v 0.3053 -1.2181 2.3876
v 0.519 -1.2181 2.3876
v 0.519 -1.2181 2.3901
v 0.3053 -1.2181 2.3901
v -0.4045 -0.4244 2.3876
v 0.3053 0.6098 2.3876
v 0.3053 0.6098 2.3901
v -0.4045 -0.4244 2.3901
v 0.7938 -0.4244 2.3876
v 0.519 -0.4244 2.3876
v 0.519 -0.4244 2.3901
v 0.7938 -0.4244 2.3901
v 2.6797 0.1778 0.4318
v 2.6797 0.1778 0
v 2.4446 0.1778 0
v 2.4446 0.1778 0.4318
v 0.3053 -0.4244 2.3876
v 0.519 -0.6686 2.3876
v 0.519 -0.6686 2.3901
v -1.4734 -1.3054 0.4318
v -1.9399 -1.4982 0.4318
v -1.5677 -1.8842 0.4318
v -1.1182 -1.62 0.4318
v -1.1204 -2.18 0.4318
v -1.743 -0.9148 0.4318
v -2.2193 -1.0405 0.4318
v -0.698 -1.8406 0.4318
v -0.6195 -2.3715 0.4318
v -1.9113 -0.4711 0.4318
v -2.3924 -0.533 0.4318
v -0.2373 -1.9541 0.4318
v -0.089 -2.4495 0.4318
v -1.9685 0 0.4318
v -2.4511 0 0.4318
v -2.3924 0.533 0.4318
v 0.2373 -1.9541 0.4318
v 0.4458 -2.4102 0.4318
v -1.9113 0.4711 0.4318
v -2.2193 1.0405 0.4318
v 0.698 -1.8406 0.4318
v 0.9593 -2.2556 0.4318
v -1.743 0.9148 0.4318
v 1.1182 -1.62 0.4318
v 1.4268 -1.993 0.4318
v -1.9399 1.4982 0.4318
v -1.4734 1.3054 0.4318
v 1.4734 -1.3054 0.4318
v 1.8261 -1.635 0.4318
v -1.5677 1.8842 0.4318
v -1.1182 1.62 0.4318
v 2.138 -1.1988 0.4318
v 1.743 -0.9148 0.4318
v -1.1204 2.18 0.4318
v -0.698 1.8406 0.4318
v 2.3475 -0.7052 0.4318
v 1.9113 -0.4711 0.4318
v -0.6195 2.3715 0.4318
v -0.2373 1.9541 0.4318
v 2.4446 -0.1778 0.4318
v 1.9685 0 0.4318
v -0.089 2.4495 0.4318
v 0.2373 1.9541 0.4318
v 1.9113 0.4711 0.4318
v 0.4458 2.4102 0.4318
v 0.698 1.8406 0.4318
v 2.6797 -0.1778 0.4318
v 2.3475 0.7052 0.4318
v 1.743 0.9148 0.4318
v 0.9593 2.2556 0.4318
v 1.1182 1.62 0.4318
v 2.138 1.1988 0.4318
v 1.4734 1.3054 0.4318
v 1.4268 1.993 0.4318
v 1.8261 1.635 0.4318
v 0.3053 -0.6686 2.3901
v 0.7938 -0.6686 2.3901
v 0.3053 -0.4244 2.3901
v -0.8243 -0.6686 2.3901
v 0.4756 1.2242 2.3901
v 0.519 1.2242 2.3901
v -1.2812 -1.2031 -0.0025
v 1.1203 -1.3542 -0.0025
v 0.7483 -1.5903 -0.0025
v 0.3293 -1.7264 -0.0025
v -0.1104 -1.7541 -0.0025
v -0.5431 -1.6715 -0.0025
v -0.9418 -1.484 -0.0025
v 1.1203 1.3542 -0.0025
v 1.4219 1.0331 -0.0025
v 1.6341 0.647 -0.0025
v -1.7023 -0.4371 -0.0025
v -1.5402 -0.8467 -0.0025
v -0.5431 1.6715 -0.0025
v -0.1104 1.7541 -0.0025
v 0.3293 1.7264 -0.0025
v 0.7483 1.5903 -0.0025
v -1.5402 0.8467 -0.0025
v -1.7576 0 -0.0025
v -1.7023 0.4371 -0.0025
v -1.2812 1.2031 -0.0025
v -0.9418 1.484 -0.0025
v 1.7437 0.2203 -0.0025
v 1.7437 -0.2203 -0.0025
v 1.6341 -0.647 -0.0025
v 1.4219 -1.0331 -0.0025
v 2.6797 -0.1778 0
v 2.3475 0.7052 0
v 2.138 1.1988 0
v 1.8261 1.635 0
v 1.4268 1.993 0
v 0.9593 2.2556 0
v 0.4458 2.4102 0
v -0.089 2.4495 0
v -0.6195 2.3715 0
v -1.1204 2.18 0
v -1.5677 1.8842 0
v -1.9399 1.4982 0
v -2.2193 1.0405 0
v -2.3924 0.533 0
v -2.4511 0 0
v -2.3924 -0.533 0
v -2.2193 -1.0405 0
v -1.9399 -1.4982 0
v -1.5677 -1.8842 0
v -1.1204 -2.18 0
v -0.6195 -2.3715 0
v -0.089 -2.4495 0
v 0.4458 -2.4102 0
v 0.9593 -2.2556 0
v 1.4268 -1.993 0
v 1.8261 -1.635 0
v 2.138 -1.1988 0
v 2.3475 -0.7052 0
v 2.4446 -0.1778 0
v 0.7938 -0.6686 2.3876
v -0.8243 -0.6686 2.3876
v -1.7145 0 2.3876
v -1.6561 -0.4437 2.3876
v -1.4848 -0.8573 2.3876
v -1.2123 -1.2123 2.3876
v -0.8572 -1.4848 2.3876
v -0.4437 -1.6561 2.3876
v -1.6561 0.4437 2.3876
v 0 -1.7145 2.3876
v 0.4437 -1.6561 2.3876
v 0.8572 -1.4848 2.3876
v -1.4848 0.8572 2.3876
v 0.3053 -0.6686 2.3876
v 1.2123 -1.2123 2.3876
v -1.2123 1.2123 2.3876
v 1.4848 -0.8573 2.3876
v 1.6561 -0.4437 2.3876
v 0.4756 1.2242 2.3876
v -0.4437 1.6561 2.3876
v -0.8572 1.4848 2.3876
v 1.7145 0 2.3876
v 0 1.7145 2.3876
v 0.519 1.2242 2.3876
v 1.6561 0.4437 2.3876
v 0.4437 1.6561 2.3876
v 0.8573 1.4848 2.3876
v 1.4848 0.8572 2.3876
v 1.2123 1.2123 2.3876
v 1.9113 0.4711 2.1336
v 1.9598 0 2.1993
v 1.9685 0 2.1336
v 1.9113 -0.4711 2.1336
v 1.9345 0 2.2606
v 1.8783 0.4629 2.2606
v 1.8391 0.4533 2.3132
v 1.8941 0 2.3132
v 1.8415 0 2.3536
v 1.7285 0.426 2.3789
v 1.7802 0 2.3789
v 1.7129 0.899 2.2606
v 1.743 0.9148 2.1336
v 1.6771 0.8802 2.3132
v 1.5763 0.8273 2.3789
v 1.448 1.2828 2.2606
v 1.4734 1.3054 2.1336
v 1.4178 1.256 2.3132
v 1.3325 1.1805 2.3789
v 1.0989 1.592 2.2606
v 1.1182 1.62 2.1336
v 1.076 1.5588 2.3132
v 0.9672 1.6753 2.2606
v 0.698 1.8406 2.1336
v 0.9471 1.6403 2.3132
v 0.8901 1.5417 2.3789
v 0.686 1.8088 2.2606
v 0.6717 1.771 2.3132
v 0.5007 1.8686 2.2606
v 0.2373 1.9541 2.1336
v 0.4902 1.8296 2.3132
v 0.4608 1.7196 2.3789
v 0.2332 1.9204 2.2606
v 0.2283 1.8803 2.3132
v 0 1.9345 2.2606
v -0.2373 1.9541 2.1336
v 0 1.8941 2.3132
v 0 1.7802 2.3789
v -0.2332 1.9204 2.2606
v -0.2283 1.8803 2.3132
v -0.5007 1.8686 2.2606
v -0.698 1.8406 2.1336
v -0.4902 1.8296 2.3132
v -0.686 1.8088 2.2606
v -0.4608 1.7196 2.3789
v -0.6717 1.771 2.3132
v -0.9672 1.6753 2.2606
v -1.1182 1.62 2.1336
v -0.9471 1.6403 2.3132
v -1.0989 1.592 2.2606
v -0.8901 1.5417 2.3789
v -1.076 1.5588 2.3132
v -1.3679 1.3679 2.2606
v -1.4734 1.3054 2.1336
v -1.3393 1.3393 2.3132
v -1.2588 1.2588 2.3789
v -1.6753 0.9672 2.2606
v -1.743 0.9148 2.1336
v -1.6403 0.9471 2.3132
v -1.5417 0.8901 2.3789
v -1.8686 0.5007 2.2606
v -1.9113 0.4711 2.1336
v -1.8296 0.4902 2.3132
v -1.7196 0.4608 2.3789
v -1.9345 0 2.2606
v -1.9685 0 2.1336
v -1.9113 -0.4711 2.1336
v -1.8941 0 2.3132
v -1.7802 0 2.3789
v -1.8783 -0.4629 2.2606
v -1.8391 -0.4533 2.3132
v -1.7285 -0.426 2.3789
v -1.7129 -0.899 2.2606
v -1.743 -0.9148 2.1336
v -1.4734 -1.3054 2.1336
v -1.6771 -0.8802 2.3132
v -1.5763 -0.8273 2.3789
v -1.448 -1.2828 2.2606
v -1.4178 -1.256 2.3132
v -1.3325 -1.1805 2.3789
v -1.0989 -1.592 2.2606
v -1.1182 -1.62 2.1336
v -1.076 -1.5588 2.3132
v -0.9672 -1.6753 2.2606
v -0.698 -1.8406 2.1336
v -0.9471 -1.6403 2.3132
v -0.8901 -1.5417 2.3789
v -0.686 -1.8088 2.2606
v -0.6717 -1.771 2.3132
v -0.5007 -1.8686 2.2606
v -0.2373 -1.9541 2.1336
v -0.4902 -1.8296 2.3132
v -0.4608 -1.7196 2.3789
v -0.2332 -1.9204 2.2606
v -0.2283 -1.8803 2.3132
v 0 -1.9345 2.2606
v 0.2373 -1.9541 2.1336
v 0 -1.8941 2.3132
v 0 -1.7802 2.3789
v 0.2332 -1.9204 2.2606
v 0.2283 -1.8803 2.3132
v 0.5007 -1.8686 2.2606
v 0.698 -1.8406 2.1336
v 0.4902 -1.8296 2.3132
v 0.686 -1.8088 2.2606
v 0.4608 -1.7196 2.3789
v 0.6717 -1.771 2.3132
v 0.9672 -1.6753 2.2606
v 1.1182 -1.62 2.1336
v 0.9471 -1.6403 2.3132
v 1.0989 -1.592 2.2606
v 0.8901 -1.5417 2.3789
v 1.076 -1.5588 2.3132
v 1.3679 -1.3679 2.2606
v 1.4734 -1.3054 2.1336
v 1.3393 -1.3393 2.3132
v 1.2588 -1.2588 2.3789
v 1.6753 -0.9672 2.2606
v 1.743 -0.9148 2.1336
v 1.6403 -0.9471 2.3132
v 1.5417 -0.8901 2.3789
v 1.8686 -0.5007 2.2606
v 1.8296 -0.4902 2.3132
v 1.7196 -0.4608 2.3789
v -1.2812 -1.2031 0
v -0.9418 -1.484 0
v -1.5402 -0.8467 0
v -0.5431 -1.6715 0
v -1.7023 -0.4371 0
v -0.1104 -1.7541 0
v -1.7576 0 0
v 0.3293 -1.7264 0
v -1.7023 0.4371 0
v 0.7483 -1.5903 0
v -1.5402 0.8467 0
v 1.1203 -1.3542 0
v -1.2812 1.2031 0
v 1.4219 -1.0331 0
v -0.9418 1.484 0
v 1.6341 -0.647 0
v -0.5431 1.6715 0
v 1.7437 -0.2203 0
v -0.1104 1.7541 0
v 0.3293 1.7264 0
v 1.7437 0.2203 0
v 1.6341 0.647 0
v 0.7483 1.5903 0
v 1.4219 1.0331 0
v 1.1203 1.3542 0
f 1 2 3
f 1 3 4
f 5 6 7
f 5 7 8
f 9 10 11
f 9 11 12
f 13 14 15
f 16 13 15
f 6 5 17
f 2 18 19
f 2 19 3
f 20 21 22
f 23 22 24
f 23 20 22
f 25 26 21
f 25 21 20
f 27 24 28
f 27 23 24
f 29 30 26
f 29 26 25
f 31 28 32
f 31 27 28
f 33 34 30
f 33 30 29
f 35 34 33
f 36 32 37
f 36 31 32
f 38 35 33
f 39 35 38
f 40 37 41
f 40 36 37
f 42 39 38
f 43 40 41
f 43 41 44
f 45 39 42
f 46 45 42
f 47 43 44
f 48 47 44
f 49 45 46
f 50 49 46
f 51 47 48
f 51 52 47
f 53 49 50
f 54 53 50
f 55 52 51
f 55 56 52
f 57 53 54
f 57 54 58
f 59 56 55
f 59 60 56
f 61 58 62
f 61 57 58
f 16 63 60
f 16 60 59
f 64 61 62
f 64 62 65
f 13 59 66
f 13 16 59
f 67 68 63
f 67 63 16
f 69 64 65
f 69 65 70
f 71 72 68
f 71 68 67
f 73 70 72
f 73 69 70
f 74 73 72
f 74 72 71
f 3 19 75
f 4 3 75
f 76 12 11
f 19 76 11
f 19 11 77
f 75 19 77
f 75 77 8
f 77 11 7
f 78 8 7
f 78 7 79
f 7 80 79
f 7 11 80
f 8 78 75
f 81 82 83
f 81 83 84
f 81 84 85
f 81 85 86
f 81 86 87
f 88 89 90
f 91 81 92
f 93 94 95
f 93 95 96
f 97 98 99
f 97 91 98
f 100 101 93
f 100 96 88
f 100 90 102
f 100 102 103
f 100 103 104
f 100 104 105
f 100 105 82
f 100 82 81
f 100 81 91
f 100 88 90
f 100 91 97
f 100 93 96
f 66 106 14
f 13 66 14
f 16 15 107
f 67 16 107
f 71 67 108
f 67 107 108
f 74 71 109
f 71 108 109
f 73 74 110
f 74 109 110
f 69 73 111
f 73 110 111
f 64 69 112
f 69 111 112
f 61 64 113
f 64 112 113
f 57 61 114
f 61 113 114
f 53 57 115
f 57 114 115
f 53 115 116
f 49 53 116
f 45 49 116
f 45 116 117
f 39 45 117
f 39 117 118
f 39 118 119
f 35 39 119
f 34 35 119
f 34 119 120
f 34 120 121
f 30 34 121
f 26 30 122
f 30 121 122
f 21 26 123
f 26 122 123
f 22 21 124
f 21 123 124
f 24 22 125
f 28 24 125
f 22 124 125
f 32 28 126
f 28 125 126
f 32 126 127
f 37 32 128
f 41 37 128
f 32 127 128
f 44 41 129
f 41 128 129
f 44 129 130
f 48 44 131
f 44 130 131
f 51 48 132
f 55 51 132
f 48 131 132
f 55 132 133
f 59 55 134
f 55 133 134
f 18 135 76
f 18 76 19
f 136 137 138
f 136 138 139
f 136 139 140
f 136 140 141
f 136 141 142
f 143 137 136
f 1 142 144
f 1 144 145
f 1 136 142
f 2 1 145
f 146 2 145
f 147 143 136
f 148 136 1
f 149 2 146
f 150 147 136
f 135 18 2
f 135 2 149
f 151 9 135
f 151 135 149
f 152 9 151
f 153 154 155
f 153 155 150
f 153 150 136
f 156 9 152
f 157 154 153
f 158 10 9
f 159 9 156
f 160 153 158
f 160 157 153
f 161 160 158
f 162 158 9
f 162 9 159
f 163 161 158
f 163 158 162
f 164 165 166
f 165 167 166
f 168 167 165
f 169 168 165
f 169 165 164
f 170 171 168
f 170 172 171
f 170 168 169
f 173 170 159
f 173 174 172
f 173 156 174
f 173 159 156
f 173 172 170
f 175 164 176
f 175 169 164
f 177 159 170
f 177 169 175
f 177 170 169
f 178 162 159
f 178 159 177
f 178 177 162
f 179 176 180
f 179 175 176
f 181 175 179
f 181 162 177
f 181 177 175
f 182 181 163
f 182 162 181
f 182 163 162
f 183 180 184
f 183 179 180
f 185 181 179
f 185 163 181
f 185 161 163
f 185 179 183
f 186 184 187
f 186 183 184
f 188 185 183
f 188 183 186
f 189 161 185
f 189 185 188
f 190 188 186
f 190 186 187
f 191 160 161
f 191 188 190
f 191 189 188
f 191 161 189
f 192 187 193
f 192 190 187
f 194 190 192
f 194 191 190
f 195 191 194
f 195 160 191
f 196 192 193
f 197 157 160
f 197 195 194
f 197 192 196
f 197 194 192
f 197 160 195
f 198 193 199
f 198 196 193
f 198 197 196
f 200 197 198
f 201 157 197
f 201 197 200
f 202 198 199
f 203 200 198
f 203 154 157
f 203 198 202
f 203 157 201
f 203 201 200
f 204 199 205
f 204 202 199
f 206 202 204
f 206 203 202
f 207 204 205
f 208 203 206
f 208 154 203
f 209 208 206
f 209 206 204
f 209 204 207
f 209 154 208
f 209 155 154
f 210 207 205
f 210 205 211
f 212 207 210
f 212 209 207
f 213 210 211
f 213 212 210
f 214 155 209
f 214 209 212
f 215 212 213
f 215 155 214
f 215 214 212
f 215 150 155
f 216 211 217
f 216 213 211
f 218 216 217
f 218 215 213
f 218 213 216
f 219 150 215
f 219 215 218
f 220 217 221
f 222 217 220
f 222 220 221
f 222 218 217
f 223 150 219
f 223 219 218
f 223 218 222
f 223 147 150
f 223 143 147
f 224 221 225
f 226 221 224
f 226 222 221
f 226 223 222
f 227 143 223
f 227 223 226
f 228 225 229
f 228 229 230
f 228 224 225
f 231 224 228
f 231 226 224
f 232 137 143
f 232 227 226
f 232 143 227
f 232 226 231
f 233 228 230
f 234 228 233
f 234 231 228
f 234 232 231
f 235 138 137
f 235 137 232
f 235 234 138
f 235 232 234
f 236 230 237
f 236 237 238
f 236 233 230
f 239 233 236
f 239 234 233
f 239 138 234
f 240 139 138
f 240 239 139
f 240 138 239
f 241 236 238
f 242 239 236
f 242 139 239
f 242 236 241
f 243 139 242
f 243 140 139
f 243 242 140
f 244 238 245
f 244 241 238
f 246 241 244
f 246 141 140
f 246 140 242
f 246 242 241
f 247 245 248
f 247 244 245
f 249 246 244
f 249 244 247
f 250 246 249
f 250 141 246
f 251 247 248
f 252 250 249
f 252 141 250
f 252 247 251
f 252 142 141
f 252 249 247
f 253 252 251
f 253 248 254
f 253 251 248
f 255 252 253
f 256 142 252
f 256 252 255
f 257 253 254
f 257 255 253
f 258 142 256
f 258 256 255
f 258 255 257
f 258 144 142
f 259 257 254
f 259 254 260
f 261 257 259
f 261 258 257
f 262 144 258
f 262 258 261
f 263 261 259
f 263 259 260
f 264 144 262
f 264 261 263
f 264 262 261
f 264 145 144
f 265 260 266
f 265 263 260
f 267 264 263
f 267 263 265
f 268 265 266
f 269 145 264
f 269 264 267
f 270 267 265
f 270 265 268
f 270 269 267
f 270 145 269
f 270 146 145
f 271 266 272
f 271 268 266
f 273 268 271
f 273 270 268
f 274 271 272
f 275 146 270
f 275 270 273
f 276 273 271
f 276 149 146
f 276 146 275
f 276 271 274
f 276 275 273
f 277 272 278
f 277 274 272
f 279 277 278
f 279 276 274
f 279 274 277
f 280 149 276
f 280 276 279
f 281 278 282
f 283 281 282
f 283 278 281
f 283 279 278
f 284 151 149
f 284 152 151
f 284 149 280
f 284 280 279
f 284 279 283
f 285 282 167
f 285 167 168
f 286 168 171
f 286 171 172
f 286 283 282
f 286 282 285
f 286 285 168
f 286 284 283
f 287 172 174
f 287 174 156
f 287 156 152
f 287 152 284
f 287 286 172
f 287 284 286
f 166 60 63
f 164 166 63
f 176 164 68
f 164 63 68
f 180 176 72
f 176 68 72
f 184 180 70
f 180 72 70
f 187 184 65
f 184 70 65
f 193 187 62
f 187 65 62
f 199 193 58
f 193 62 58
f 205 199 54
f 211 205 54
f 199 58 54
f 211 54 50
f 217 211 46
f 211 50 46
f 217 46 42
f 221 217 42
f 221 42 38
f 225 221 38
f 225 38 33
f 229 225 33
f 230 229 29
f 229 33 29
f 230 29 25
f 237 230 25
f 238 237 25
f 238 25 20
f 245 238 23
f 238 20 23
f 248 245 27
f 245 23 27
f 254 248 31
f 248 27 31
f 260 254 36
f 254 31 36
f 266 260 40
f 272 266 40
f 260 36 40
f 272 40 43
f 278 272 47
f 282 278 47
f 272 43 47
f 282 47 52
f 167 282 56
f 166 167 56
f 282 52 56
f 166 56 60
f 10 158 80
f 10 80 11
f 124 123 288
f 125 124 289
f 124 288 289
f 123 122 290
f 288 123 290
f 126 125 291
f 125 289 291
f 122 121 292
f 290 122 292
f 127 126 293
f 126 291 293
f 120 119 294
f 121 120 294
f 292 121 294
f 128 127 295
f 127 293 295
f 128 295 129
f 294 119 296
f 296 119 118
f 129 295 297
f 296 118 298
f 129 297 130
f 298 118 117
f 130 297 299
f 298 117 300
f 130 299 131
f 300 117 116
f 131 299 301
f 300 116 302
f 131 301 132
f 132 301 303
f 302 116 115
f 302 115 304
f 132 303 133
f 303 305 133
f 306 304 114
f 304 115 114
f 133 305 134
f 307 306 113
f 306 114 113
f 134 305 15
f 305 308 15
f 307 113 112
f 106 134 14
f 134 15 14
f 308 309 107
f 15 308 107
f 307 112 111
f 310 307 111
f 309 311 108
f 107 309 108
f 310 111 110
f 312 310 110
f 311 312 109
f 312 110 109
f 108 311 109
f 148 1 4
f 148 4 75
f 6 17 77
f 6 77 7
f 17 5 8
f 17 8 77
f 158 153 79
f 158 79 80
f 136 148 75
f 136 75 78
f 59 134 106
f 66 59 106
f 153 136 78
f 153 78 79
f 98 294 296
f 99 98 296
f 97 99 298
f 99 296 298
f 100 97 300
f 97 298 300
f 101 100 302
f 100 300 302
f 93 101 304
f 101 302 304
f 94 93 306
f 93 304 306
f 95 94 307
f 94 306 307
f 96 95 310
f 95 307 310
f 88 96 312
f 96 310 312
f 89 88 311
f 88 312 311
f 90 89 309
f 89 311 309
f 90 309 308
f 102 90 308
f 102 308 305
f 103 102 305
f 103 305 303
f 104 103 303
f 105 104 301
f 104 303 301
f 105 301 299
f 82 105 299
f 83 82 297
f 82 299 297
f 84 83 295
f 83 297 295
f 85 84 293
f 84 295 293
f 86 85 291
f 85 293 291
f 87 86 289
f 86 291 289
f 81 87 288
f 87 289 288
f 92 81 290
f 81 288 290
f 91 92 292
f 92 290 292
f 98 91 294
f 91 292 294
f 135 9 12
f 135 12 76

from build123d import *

# Parameters (mm, degrees)
BOSS_EXTRUDE1_DEPTH = 0.4318
SKETCH2_R           = 1.9685
BOSS_EXTRUDE2_DEPTH = 1.9558
SKETCH3_R           = 1.757566481
BOSS_EXTRUDE3_DEPTH = 0.00254
FILLET1_R           = 0.254
BOSS_EXTRUDE6_DEPTH = 0.00254


with BuildPart() as part:
    # Sketch1 → Boss-Extrude1 (new body)
    with BuildSketch(Plane.XY):
        with BuildLine():
            Line((2.6797, 0.1778), (2.4511, 0.1778))
            Line((2.4511, 0.1778), (2.44464279, 0.1778))
            ThreePointArc((2.44464279, 0.1778), (-2.4511, 0), (2.44464279, -0.1778))
            Line((2.44464279, -0.1778), (2.4511, -0.1778))
            Line((2.4511, -0.1778), (2.6797, -0.1778))
            Line((2.6797, -0.1778), (2.6797, 0.1778))
        make_face()
    extrude(amount=BOSS_EXTRUDE1_DEPTH)

    # Sketch2 → Boss-Extrude2 (add)
    with BuildSketch(Plane.XY.offset(0.4318)):
        Circle(SKETCH2_R)
    extrude(amount=BOSS_EXTRUDE2_DEPTH)

    # Sketch3 → Boss-Extrude3 (add)
    with BuildSketch(Plane(origin=(0, 0, 0), x_dir=(-1, 0, 0), z_dir=(0, 0, -1))):
        Circle(SKETCH3_R)
    extrude(amount=BOSS_EXTRUDE3_DEPTH)

    # Fillet1
    fillet1_edges = [part.edges().sort_by_distance(p)[0] for p in [
        (-1.9685, 0, 2.3876),
    ]]
    fillet(fillet1_edges, radius=FILLET1_R)

    # Sketch4 → Boss-Extrude6 (add)
    with BuildSketch(Plane.XY.offset(2.3876)):
        Polygon((0.475582181, 1.224166485), (0.518990385, 1.224166485), (0.518990385, -0.424391207), (0.79375, -0.424391207), (0.79375, -0.668621976), (0.518990385, -0.668621976), (0.518990385, -1.218141207), (0.305288462, -1.218141207), (0.305288462, -0.668621976), (-0.824278846, -0.668621976), align=None)
        Polygon((0.305288462, -0.424391207), (0.305288462, 0.609773457), (-0.404507212, -0.424391207), align=None, mode=Mode.SUBTRACT)
    extrude(amount=BOSS_EXTRUDE6_DEPTH)


solid = part.part
